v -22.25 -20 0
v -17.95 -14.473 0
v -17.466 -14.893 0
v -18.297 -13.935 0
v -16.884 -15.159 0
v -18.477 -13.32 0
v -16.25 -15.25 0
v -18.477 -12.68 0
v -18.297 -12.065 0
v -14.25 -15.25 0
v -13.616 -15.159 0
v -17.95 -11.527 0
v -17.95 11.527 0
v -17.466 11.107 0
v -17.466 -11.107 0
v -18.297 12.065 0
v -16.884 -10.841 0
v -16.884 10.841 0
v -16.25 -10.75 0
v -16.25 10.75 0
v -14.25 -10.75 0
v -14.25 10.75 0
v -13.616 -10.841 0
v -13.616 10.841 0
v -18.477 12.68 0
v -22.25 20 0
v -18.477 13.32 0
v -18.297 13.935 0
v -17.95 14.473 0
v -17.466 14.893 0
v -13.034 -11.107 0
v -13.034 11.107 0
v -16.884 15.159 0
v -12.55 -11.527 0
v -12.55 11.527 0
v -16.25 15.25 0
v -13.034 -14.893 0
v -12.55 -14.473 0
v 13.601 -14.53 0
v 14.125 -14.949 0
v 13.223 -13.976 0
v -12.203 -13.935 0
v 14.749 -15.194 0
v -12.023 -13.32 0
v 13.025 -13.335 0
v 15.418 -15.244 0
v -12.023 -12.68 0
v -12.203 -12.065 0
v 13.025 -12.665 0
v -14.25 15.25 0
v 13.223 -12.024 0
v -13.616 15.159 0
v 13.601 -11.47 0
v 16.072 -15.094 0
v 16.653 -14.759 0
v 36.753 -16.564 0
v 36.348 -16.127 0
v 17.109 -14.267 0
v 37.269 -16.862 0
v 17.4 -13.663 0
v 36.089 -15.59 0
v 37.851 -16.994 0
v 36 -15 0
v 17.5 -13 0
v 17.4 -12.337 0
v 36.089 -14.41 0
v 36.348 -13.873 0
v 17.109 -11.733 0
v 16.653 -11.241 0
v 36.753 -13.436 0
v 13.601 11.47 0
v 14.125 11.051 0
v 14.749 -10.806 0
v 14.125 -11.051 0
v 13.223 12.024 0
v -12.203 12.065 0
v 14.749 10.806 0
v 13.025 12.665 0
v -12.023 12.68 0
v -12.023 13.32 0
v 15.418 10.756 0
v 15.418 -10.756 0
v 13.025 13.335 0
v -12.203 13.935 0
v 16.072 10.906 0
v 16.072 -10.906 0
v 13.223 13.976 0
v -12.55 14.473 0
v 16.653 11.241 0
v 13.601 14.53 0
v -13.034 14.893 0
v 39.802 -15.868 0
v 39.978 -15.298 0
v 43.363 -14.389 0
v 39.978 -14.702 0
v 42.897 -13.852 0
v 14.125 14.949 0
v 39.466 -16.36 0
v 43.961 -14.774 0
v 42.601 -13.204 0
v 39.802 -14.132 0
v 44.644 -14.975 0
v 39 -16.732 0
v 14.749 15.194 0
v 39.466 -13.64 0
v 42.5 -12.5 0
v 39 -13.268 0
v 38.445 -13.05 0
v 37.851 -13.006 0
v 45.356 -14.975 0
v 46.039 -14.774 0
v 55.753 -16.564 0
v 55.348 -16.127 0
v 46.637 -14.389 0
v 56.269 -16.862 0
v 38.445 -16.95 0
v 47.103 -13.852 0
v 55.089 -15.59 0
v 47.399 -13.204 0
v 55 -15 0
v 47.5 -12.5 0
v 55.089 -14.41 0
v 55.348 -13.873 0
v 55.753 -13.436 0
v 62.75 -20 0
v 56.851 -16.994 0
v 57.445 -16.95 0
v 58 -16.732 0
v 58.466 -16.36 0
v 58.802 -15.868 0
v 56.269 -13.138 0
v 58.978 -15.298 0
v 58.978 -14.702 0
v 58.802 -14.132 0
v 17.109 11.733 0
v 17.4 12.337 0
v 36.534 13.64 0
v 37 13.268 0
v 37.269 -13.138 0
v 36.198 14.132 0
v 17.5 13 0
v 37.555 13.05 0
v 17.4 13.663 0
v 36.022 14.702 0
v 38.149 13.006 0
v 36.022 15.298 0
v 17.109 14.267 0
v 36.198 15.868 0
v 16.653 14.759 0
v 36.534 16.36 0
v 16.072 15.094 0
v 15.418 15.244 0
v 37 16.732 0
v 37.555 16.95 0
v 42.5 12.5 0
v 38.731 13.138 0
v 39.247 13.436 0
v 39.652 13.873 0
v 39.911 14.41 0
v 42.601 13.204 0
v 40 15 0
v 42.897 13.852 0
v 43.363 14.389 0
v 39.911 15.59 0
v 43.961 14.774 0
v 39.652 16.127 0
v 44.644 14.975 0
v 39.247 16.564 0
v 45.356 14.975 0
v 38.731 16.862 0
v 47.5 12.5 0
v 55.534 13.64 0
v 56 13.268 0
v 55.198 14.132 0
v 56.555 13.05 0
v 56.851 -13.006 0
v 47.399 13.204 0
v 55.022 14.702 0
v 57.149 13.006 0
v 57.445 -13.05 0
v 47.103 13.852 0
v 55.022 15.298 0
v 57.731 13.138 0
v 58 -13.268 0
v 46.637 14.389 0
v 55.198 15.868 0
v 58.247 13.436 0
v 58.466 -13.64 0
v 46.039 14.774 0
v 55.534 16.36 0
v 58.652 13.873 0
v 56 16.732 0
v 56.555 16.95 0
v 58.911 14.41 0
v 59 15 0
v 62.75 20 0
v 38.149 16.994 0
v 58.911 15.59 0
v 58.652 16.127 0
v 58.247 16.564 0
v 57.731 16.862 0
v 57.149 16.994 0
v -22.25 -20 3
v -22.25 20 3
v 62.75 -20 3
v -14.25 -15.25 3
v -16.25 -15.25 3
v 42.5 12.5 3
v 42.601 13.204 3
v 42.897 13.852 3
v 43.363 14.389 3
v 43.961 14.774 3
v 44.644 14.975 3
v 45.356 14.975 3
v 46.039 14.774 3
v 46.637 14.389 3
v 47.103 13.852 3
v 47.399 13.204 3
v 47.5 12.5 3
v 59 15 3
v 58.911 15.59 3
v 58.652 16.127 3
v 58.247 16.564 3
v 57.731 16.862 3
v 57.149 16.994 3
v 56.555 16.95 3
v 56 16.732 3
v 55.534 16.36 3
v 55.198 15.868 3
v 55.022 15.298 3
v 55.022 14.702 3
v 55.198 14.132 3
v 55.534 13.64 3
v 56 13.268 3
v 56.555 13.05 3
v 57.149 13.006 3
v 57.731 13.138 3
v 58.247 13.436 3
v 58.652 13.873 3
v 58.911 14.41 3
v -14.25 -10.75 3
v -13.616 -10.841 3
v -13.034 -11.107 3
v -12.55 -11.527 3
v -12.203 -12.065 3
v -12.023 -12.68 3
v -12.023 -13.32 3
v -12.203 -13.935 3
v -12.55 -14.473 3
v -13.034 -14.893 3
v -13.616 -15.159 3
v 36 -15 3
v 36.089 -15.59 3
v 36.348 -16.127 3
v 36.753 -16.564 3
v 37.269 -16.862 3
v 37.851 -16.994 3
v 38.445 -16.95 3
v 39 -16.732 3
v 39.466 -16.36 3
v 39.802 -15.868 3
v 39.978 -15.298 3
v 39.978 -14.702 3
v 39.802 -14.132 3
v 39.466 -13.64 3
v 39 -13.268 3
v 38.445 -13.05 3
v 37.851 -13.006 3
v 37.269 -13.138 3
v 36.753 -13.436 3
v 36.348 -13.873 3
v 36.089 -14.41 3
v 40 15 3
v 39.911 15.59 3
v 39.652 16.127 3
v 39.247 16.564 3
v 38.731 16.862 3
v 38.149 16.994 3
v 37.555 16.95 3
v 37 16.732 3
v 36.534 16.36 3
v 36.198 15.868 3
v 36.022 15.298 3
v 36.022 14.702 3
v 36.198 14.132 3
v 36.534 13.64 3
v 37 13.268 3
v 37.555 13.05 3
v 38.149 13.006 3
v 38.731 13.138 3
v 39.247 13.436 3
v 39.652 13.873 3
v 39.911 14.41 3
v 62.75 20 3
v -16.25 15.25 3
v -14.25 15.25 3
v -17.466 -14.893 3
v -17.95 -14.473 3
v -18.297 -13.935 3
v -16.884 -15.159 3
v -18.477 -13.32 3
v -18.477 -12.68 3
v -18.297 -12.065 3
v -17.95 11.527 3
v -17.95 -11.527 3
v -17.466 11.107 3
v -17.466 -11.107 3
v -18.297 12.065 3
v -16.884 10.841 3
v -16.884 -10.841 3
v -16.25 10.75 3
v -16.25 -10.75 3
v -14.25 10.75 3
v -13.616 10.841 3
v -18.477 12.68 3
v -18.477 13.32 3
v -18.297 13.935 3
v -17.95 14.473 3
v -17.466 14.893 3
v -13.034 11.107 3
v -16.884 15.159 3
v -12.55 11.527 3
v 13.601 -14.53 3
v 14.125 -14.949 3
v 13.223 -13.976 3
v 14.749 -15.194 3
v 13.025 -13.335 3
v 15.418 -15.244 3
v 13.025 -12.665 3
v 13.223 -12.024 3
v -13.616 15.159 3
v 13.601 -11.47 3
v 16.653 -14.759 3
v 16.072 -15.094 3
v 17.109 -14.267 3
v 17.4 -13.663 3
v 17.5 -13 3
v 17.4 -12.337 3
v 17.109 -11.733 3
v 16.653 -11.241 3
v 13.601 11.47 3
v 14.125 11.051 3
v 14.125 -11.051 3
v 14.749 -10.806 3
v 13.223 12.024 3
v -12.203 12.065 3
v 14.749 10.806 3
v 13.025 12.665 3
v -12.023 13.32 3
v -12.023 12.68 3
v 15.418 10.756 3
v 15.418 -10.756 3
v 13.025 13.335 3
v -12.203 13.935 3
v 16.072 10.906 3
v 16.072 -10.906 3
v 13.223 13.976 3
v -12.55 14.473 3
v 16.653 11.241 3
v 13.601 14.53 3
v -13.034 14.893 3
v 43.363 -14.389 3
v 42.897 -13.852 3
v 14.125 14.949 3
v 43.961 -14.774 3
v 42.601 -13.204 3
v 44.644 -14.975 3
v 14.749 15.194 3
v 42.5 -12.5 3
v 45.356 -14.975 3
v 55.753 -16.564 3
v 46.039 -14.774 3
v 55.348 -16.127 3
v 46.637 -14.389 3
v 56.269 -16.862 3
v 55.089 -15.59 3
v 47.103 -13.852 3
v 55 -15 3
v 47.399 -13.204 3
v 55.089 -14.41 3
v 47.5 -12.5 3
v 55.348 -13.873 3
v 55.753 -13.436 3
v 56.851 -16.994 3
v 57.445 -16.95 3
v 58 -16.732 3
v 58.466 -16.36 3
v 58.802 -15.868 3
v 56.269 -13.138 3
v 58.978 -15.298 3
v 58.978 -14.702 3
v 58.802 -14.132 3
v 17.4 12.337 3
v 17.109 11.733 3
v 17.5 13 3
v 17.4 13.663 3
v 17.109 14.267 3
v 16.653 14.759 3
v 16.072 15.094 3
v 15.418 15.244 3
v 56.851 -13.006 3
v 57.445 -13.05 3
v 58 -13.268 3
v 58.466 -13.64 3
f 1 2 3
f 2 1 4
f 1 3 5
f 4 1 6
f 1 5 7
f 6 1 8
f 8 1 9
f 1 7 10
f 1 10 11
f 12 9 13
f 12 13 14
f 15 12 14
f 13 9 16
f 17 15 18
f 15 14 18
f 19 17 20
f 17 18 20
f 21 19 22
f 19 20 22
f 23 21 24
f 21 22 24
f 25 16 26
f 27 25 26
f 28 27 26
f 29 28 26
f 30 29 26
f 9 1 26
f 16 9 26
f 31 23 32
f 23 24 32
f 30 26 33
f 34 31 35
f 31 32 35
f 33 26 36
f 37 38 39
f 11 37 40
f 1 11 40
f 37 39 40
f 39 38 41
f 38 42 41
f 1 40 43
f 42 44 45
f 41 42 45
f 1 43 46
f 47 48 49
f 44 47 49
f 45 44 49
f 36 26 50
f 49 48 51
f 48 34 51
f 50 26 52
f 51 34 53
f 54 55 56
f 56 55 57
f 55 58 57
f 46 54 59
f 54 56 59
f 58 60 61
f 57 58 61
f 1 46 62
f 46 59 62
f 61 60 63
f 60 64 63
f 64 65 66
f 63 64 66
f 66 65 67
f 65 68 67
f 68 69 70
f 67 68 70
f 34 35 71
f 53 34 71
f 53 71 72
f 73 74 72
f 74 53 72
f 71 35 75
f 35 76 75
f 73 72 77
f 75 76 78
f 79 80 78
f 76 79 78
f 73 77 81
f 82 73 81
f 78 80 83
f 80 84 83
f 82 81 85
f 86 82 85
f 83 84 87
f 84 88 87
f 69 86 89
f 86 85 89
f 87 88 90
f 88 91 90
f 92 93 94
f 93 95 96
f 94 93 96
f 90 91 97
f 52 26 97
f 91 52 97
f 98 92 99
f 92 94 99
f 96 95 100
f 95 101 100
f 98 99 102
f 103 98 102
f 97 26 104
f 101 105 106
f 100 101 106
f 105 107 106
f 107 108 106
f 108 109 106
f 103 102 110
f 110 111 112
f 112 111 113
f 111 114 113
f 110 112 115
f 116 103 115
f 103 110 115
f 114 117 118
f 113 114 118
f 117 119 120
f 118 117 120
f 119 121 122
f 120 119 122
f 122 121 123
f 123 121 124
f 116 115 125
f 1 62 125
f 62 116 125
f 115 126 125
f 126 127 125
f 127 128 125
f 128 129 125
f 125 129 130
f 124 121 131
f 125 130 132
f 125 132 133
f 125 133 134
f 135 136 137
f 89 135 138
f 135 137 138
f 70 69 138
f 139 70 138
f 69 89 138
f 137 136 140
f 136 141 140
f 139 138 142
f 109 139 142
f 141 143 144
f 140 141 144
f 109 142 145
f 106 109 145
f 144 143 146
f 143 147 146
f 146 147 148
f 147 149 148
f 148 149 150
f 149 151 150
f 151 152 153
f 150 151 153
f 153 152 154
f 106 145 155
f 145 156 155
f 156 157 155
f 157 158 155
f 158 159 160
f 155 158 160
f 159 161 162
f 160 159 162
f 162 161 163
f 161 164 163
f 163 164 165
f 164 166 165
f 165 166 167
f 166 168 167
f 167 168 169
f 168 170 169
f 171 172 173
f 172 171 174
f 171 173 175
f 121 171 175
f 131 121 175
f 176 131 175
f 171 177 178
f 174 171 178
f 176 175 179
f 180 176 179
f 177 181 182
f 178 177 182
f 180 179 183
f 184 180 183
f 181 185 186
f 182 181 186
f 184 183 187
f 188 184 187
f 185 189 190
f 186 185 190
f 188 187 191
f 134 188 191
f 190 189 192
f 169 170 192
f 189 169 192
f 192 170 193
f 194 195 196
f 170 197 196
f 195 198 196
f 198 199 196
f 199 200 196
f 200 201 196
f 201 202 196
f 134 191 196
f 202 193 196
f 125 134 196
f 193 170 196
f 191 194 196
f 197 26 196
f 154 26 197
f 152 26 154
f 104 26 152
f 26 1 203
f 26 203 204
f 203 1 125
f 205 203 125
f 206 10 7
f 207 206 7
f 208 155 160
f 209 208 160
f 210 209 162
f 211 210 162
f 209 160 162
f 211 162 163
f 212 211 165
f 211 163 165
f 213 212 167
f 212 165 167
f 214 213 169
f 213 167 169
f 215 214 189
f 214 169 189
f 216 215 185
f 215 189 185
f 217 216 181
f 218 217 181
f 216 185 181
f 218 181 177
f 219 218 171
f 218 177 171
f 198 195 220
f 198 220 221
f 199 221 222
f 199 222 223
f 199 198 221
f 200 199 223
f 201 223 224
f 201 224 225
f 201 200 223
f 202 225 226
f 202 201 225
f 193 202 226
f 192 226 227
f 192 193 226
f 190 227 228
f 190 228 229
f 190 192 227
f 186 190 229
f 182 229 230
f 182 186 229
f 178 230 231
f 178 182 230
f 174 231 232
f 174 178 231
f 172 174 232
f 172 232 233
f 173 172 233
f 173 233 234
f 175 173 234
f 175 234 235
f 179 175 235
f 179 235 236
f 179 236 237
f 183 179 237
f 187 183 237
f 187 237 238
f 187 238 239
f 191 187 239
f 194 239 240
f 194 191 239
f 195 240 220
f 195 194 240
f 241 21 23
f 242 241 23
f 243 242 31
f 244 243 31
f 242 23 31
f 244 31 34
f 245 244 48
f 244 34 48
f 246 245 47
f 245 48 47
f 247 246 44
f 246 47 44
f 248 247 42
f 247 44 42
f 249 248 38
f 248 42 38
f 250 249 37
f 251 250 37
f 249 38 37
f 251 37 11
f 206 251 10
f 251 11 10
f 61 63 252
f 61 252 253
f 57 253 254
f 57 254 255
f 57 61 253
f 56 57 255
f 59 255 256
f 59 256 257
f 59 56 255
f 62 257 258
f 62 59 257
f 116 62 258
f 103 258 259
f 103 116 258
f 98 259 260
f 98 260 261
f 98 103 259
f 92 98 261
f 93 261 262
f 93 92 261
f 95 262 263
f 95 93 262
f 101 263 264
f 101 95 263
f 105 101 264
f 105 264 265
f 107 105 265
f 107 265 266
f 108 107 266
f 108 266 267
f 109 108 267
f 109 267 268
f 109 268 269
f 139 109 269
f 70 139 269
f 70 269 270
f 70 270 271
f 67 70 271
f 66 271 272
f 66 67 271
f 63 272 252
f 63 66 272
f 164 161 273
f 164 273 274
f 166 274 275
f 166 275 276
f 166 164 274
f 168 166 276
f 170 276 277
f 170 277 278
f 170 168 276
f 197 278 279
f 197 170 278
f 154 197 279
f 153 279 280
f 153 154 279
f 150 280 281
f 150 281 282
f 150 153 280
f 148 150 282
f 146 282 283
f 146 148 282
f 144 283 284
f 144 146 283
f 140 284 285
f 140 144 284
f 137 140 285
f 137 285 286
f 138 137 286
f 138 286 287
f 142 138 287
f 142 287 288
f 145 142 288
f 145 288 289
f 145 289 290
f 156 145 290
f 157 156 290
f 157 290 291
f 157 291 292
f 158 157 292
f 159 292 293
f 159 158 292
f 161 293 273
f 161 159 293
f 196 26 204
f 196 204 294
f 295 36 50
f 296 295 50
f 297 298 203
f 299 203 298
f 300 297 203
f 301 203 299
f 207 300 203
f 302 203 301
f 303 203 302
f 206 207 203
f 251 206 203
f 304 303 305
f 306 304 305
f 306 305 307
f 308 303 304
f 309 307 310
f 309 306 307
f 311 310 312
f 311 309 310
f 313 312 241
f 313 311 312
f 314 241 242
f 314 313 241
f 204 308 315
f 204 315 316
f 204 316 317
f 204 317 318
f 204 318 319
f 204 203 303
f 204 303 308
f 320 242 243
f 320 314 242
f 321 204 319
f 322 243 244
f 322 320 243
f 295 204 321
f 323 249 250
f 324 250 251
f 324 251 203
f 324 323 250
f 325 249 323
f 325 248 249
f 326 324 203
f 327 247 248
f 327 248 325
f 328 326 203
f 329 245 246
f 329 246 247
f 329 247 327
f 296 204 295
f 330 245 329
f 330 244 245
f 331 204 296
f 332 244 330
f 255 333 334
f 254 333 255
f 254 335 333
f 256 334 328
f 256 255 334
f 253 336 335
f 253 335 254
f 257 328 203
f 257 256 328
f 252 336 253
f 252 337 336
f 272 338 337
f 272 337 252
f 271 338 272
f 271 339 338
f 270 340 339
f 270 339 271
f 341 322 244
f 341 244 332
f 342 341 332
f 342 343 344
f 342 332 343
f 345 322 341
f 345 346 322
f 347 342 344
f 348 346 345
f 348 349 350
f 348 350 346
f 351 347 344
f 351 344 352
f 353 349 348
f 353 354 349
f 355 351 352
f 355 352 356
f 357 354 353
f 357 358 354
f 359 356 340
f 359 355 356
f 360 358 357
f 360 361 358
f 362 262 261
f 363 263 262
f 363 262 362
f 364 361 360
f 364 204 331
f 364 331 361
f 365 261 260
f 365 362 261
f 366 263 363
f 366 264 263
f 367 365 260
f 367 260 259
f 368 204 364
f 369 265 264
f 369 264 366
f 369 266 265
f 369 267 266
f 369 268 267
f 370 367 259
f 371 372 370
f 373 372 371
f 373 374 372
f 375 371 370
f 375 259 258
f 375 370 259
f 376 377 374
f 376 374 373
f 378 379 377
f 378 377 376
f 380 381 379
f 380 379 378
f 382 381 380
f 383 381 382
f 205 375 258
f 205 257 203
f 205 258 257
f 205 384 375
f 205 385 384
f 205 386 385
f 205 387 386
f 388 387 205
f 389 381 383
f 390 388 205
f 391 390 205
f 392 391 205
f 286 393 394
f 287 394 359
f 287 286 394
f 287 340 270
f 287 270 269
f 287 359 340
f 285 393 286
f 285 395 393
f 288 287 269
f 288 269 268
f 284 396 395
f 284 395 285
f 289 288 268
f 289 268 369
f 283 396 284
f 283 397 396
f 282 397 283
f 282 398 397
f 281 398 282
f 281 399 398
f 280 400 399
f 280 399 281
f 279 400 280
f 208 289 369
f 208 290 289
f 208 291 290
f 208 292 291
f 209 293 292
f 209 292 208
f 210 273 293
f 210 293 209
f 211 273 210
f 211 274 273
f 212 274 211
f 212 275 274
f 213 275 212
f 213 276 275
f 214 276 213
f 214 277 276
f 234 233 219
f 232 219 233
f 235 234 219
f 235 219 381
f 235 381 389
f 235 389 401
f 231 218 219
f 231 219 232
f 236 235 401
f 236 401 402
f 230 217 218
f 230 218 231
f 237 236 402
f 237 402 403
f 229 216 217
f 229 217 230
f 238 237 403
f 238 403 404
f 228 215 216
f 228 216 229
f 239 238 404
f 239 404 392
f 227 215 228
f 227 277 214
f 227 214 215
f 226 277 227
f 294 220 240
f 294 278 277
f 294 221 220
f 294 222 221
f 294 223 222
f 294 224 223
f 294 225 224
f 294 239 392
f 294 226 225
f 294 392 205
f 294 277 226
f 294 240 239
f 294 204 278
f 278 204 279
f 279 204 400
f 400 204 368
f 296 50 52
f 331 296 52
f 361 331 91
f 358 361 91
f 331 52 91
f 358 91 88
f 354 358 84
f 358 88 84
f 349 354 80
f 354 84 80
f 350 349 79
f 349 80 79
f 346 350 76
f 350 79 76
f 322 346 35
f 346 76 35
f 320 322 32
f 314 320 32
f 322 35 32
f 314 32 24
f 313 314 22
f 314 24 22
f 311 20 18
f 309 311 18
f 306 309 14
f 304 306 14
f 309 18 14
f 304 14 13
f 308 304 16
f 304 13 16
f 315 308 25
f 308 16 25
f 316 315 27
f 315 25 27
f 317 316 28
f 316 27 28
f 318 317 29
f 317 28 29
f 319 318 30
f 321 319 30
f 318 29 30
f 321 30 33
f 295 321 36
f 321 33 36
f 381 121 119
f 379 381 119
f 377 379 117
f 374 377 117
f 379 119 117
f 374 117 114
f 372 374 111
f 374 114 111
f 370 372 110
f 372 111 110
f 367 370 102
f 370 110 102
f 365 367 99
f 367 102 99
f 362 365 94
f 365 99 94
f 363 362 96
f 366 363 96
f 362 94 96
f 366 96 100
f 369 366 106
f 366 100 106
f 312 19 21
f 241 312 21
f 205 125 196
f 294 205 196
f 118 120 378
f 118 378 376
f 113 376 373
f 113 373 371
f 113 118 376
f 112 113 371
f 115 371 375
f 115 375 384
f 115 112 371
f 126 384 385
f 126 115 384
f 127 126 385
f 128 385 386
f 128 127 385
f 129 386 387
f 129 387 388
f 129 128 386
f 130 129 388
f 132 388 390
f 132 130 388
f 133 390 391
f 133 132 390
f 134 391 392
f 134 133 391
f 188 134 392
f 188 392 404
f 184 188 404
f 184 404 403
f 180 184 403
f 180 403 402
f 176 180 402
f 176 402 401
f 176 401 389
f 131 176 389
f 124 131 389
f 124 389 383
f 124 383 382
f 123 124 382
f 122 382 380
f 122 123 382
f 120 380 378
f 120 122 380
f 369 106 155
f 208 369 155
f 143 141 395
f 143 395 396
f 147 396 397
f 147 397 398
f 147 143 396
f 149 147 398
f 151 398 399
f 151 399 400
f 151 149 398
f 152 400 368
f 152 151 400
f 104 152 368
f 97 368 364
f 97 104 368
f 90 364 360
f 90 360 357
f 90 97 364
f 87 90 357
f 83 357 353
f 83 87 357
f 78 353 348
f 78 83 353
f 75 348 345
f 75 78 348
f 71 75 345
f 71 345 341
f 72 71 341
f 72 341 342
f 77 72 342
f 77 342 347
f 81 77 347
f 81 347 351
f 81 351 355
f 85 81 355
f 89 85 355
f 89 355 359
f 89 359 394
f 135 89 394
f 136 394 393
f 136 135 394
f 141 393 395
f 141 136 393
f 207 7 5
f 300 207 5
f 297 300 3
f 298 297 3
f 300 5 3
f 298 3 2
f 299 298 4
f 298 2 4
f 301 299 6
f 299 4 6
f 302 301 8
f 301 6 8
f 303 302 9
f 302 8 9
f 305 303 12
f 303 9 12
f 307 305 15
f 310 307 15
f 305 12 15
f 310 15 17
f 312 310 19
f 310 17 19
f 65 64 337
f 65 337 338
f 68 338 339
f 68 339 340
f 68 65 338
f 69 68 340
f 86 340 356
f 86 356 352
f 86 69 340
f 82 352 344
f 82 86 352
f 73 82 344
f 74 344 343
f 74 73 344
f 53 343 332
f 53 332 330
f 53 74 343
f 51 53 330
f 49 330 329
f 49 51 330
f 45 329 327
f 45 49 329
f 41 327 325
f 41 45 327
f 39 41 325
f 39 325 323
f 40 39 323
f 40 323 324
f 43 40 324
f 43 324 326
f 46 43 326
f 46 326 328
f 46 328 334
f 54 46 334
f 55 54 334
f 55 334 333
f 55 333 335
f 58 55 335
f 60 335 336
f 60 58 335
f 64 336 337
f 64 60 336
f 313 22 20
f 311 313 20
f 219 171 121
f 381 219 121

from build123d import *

# Parameters (mm, degrees)
SKETCH_1_W      = 85
SKETCH_1_H      = 40
SKETCH_1_R      = 2.25
SKETCH_1_R_2    = 2
EXTRUDE_1_DEPTH = 3


with BuildPart() as part:
    # 草图1 → 凸台-拉伸1 (new body)
    with BuildSketch(Plane.XY):
        with Locations((20.25, 0)):
            Rectangle(SKETCH_1_W, SKETCH_1_H)
        with Locations((15.25, 13)):
            Circle(SKETCH_1_R, mode=Mode.SUBTRACT)
        with Locations((15.25, -13)):
            Circle(SKETCH_1_R, mode=Mode.SUBTRACT)
        with Locations((57, 15)):
            Circle(SKETCH_1_R_2, mode=Mode.SUBTRACT)
        with Locations((38, 15)):
            Circle(SKETCH_1_R_2, mode=Mode.SUBTRACT)
        with Locations(Location((57, -15, 0), (0, 0, 180))):
            Circle(SKETCH_1_R_2, mode=Mode.SUBTRACT)
        with Locations(Location((38, -15, 0), (0, 0, 180))):
            Circle(SKETCH_1_R_2, mode=Mode.SUBTRACT)
        with BuildLine():
            Line((-14.25, 10.75), (-16.25, 10.75))
            ThreePointArc((-16.25, 10.75), (-18.5, 13), (-16.25, 15.25))
            Line((-16.25, 15.25), (-14.25, 15.25))
            ThreePointArc((-14.25, 15.25), (-12, 13), (-14.25, 10.75))
        make_face(mode=Mode.SUBTRACT)
        with BuildLine():
            Line((-14.25, -15.25), (-16.25, -15.25))
            ThreePointArc((-16.25, -15.25), (-18.5, -13), (-16.25, -10.75))
            Line((-16.25, -10.75), (-14.25, -10.75))
            ThreePointArc((-14.25, -10.75), (-12, -13), (-14.25, -15.25))
        make_face(mode=Mode.SUBTRACT)
        with BuildLine():
            Line((42.5, -12.5), (42.5, 12.5))
            ThreePointArc((42.5, 12.5), (45, 15), (47.5, 12.5))
            Line((47.5, 12.5), (47.5, -12.5))
            ThreePointArc((47.5, -12.5), (45, -15), (42.5, -12.5))
        make_face(mode=Mode.SUBTRACT)
    extrude(amount=EXTRUDE_1_DEPTH)


solid = part.part
